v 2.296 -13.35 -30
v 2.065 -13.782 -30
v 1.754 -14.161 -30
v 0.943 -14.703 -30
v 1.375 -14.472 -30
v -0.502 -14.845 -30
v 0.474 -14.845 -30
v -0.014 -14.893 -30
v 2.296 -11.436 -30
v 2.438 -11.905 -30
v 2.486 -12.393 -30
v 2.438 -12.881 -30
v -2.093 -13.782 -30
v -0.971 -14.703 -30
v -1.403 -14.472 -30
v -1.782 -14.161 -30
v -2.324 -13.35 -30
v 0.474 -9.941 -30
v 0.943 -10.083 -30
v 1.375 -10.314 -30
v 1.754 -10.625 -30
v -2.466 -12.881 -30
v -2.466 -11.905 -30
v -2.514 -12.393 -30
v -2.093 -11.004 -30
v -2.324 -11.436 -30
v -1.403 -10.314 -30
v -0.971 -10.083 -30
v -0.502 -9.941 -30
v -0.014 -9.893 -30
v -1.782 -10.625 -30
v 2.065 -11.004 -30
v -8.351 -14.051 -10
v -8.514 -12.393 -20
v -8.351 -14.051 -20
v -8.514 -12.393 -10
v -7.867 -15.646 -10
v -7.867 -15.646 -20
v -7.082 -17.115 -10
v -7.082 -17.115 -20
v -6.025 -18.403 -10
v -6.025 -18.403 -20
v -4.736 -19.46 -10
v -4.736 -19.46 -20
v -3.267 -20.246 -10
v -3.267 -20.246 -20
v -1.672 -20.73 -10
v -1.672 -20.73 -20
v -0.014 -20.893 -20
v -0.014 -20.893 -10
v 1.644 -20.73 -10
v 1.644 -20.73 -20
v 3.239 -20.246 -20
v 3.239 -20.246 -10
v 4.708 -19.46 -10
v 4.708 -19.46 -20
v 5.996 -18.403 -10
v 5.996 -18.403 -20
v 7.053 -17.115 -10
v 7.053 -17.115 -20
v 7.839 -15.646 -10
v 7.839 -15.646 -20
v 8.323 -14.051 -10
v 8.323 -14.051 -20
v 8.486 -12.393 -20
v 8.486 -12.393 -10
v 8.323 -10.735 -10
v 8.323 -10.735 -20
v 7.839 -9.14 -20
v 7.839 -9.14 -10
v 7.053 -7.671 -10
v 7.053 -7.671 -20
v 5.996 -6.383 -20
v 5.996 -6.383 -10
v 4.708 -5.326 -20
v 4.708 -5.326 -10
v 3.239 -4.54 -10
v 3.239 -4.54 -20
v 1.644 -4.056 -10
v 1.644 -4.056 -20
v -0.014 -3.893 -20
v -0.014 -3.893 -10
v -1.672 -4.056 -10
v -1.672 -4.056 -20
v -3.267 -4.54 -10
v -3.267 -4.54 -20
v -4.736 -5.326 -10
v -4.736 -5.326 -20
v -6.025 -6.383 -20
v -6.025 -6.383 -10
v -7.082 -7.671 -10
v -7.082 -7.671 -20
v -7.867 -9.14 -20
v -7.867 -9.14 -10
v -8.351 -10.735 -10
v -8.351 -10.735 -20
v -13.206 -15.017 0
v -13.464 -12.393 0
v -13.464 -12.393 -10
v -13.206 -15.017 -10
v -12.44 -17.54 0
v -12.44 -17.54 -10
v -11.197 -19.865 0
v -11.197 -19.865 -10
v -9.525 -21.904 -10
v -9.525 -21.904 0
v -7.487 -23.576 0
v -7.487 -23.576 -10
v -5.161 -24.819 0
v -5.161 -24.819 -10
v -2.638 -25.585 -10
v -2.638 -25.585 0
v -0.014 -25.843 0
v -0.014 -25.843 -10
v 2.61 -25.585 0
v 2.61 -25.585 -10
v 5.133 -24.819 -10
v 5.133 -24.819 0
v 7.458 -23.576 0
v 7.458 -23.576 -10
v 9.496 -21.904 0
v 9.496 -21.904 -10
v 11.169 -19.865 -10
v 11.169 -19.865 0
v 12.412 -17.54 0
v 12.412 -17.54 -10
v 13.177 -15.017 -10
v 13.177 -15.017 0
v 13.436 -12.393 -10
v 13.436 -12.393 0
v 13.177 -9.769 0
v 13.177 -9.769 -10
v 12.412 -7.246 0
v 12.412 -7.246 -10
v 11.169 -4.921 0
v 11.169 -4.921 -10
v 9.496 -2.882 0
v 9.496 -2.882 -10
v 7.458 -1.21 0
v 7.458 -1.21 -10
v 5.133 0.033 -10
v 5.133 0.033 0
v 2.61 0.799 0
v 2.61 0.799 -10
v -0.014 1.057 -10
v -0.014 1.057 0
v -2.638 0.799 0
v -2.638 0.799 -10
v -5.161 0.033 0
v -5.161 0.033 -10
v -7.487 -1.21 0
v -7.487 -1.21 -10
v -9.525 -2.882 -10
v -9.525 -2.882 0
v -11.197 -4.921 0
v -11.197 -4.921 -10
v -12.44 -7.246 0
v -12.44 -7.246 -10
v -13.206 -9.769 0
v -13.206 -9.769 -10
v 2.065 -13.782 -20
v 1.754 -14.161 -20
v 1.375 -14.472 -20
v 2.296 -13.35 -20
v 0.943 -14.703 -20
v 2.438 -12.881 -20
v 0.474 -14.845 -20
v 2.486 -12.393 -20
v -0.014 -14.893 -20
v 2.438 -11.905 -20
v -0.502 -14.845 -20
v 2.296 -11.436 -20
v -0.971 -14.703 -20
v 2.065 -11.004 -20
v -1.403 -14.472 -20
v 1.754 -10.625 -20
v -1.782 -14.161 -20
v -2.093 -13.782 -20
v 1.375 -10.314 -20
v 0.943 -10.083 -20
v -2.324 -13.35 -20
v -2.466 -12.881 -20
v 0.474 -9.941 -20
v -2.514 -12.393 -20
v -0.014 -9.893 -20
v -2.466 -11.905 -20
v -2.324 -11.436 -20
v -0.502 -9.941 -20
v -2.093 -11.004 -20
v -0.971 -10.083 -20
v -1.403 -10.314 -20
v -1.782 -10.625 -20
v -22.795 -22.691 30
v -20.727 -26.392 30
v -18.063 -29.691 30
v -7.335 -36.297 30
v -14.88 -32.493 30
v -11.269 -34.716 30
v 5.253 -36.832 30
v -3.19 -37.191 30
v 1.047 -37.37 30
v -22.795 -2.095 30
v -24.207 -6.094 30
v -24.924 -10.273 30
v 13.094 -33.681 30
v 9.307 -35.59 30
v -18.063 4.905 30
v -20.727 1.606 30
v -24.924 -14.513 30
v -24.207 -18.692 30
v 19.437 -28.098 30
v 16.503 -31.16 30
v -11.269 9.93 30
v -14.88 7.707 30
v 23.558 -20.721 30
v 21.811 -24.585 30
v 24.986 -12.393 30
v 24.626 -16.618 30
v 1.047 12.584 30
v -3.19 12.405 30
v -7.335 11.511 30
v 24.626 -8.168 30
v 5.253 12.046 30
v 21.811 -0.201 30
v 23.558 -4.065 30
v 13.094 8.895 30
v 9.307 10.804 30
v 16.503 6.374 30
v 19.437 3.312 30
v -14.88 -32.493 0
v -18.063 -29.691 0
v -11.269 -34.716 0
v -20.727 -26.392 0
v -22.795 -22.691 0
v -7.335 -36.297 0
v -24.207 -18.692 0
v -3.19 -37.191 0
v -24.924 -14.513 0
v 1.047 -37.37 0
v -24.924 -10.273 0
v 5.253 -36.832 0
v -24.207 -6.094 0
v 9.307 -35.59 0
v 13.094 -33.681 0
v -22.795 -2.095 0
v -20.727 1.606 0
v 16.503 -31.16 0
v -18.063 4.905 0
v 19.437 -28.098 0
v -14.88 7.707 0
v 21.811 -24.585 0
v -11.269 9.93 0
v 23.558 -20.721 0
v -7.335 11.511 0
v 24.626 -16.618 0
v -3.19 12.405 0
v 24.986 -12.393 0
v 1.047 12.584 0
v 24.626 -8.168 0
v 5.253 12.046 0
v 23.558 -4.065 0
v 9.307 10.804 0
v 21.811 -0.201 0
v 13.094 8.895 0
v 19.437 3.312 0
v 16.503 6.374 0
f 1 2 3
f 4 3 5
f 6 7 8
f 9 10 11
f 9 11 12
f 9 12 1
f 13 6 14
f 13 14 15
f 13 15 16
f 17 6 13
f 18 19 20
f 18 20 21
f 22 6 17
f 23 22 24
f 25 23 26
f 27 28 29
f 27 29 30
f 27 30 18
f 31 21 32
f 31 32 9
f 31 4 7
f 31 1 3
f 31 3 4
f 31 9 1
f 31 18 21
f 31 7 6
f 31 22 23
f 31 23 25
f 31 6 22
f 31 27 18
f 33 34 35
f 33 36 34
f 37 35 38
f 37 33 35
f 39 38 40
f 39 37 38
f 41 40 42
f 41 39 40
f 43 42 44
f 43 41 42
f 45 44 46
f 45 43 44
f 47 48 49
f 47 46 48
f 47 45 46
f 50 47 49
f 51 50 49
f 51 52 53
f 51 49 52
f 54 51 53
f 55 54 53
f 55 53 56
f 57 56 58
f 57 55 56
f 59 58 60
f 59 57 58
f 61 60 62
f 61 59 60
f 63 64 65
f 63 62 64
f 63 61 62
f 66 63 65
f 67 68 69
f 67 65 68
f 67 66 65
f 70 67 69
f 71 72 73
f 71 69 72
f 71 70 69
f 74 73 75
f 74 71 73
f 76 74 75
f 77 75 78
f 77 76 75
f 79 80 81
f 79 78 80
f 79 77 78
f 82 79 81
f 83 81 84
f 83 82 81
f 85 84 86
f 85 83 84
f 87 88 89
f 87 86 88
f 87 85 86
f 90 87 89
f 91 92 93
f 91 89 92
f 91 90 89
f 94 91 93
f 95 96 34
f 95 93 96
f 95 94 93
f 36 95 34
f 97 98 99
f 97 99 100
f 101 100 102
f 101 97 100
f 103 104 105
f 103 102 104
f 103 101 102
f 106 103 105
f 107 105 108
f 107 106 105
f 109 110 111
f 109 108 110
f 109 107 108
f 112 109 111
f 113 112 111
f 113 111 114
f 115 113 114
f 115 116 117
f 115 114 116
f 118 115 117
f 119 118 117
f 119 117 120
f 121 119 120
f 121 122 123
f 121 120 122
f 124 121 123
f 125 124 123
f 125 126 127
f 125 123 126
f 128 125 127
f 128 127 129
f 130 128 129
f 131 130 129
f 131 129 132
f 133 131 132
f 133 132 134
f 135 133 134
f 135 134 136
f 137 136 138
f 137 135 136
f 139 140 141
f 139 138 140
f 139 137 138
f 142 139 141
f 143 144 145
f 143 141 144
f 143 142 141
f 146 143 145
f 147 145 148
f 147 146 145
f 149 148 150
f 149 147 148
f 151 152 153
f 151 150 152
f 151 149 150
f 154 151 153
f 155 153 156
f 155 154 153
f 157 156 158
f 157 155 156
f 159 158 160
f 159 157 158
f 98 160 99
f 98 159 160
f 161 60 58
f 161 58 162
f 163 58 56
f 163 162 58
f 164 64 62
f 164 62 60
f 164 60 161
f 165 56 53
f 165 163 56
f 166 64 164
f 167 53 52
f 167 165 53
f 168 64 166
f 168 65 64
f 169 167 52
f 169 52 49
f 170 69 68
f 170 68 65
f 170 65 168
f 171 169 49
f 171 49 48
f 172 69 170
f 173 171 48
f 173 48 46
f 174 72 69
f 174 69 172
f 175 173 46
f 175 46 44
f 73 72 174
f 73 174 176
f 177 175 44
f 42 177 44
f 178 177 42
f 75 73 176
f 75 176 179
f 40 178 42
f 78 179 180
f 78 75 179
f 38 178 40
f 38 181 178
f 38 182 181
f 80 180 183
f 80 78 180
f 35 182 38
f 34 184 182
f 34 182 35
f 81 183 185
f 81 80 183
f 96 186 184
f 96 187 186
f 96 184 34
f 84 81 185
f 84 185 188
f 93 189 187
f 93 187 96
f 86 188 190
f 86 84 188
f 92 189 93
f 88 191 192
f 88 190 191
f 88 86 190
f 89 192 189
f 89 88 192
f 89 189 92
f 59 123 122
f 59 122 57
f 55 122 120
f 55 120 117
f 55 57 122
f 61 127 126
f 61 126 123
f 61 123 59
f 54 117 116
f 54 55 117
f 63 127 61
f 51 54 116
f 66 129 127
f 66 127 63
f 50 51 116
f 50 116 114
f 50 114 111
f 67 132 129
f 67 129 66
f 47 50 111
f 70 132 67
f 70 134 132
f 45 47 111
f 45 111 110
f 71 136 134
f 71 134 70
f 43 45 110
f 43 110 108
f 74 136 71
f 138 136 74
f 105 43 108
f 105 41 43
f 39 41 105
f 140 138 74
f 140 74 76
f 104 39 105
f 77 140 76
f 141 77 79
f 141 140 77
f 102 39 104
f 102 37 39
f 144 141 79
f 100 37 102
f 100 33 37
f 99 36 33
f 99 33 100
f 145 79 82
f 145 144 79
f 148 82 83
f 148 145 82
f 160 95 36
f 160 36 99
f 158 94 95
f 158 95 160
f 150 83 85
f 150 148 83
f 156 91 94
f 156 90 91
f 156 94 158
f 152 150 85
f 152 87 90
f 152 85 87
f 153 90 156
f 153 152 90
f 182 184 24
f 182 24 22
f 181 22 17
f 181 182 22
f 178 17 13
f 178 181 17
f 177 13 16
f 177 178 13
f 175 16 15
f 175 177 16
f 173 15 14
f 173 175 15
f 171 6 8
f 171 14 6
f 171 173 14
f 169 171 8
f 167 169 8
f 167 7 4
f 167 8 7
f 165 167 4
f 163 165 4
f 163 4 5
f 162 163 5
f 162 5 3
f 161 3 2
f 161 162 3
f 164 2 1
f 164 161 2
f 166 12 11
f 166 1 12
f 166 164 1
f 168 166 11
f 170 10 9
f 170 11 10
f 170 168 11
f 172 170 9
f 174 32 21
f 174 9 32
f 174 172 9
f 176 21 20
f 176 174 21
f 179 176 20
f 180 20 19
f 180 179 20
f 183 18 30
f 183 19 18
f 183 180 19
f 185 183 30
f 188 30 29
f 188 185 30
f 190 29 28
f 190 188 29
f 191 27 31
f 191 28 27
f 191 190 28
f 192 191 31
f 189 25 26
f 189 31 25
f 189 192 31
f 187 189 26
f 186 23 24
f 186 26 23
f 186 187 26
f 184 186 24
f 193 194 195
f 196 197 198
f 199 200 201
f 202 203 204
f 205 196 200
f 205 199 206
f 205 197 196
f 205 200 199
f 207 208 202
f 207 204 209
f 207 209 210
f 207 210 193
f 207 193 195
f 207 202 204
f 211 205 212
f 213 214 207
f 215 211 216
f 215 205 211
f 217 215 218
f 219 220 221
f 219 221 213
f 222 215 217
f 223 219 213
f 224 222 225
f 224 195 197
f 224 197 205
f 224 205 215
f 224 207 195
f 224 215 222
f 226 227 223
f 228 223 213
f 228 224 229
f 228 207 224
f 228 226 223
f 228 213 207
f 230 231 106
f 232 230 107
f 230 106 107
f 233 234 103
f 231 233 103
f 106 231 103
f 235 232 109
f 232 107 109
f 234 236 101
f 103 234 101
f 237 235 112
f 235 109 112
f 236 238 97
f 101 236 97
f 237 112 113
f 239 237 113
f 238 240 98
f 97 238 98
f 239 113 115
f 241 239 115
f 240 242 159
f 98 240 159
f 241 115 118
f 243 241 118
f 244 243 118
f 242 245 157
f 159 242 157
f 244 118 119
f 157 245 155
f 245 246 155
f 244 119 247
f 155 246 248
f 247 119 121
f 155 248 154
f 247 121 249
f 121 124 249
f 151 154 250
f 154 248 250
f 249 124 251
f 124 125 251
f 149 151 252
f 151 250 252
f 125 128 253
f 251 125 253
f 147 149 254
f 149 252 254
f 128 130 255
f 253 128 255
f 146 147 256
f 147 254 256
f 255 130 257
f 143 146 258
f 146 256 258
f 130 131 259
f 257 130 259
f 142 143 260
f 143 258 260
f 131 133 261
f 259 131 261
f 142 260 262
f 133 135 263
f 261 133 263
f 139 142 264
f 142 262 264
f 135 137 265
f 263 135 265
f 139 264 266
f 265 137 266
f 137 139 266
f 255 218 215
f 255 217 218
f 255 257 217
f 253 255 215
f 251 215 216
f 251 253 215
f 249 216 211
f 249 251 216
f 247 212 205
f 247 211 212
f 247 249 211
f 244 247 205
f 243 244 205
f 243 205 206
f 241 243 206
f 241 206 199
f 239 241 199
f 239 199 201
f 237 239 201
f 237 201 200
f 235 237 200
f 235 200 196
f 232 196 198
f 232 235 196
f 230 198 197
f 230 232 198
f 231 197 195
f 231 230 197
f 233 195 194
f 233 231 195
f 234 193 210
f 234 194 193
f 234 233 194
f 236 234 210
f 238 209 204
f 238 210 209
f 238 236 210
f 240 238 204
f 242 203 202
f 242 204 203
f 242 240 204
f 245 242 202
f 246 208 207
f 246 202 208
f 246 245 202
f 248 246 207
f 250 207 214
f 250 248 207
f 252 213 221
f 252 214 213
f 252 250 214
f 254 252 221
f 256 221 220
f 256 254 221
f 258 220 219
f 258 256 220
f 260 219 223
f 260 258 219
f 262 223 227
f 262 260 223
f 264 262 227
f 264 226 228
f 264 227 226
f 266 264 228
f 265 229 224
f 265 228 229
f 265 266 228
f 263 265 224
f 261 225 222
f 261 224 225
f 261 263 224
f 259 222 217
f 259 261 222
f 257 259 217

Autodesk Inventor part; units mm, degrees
ref_plane "YZ Plane" through (0, 0, 0) normal (1, 0, 0) x (0, 1, 0)
ref_plane "XZ Plane" through (0, 0, 0) normal (0, 1, 0) x (-1, 0, 0)
ref_plane "XY Plane" through (0, 0, 0) normal (0, 0, 1) x (1, 0, 0)
sketch "Эскиз1" plane through (0, 0, 0) normal (0, 0, 1) x (1, 0, 0)
  circle A0 centre (-0.0141, -12.393) radius 25
  point P0 (0, 0)
  dimension "d0" = 50
extrude "Выдавливание1" add sketch "Эскиз1" along normal blind 30
sketch "Эскиз2" plane through (-0.0141, -12.393, 0) normal (0, 0, -1) x (-1, 0, 0)
  circle A0 centre (0, 0) radius 13.45 projected
  point P0 (-0.0141, 12.393)
extrude "Выдавливание2" add sketch "Эскиз2" along normal blind 10
sketch "Эскиз3" plane through (-0.0141, -12.393, -10) normal (0, 0, -1) x (-1, 0, 0)
  circle A0 centre (0, 0) radius 8.5
  point P0 (-0.0141, 12.393)
  dimension "d5" = 17
extrude "Выдавливание3" add sketch "Эскиз3" along normal blind 10
sketch "Эскиз4" plane through (-0.0141, -12.393, -20) normal (0, 0, -1) x (-1, 0, 0)
  circle A0 centre (0, 0) radius 2.5
  point P0 (-0.0141, 12.393)
  dimension "d8" = 5
extrude "Выдавливание4" add sketch "Эскиз4" along normal blind 10
properties part number "Верх. часть штатива"
